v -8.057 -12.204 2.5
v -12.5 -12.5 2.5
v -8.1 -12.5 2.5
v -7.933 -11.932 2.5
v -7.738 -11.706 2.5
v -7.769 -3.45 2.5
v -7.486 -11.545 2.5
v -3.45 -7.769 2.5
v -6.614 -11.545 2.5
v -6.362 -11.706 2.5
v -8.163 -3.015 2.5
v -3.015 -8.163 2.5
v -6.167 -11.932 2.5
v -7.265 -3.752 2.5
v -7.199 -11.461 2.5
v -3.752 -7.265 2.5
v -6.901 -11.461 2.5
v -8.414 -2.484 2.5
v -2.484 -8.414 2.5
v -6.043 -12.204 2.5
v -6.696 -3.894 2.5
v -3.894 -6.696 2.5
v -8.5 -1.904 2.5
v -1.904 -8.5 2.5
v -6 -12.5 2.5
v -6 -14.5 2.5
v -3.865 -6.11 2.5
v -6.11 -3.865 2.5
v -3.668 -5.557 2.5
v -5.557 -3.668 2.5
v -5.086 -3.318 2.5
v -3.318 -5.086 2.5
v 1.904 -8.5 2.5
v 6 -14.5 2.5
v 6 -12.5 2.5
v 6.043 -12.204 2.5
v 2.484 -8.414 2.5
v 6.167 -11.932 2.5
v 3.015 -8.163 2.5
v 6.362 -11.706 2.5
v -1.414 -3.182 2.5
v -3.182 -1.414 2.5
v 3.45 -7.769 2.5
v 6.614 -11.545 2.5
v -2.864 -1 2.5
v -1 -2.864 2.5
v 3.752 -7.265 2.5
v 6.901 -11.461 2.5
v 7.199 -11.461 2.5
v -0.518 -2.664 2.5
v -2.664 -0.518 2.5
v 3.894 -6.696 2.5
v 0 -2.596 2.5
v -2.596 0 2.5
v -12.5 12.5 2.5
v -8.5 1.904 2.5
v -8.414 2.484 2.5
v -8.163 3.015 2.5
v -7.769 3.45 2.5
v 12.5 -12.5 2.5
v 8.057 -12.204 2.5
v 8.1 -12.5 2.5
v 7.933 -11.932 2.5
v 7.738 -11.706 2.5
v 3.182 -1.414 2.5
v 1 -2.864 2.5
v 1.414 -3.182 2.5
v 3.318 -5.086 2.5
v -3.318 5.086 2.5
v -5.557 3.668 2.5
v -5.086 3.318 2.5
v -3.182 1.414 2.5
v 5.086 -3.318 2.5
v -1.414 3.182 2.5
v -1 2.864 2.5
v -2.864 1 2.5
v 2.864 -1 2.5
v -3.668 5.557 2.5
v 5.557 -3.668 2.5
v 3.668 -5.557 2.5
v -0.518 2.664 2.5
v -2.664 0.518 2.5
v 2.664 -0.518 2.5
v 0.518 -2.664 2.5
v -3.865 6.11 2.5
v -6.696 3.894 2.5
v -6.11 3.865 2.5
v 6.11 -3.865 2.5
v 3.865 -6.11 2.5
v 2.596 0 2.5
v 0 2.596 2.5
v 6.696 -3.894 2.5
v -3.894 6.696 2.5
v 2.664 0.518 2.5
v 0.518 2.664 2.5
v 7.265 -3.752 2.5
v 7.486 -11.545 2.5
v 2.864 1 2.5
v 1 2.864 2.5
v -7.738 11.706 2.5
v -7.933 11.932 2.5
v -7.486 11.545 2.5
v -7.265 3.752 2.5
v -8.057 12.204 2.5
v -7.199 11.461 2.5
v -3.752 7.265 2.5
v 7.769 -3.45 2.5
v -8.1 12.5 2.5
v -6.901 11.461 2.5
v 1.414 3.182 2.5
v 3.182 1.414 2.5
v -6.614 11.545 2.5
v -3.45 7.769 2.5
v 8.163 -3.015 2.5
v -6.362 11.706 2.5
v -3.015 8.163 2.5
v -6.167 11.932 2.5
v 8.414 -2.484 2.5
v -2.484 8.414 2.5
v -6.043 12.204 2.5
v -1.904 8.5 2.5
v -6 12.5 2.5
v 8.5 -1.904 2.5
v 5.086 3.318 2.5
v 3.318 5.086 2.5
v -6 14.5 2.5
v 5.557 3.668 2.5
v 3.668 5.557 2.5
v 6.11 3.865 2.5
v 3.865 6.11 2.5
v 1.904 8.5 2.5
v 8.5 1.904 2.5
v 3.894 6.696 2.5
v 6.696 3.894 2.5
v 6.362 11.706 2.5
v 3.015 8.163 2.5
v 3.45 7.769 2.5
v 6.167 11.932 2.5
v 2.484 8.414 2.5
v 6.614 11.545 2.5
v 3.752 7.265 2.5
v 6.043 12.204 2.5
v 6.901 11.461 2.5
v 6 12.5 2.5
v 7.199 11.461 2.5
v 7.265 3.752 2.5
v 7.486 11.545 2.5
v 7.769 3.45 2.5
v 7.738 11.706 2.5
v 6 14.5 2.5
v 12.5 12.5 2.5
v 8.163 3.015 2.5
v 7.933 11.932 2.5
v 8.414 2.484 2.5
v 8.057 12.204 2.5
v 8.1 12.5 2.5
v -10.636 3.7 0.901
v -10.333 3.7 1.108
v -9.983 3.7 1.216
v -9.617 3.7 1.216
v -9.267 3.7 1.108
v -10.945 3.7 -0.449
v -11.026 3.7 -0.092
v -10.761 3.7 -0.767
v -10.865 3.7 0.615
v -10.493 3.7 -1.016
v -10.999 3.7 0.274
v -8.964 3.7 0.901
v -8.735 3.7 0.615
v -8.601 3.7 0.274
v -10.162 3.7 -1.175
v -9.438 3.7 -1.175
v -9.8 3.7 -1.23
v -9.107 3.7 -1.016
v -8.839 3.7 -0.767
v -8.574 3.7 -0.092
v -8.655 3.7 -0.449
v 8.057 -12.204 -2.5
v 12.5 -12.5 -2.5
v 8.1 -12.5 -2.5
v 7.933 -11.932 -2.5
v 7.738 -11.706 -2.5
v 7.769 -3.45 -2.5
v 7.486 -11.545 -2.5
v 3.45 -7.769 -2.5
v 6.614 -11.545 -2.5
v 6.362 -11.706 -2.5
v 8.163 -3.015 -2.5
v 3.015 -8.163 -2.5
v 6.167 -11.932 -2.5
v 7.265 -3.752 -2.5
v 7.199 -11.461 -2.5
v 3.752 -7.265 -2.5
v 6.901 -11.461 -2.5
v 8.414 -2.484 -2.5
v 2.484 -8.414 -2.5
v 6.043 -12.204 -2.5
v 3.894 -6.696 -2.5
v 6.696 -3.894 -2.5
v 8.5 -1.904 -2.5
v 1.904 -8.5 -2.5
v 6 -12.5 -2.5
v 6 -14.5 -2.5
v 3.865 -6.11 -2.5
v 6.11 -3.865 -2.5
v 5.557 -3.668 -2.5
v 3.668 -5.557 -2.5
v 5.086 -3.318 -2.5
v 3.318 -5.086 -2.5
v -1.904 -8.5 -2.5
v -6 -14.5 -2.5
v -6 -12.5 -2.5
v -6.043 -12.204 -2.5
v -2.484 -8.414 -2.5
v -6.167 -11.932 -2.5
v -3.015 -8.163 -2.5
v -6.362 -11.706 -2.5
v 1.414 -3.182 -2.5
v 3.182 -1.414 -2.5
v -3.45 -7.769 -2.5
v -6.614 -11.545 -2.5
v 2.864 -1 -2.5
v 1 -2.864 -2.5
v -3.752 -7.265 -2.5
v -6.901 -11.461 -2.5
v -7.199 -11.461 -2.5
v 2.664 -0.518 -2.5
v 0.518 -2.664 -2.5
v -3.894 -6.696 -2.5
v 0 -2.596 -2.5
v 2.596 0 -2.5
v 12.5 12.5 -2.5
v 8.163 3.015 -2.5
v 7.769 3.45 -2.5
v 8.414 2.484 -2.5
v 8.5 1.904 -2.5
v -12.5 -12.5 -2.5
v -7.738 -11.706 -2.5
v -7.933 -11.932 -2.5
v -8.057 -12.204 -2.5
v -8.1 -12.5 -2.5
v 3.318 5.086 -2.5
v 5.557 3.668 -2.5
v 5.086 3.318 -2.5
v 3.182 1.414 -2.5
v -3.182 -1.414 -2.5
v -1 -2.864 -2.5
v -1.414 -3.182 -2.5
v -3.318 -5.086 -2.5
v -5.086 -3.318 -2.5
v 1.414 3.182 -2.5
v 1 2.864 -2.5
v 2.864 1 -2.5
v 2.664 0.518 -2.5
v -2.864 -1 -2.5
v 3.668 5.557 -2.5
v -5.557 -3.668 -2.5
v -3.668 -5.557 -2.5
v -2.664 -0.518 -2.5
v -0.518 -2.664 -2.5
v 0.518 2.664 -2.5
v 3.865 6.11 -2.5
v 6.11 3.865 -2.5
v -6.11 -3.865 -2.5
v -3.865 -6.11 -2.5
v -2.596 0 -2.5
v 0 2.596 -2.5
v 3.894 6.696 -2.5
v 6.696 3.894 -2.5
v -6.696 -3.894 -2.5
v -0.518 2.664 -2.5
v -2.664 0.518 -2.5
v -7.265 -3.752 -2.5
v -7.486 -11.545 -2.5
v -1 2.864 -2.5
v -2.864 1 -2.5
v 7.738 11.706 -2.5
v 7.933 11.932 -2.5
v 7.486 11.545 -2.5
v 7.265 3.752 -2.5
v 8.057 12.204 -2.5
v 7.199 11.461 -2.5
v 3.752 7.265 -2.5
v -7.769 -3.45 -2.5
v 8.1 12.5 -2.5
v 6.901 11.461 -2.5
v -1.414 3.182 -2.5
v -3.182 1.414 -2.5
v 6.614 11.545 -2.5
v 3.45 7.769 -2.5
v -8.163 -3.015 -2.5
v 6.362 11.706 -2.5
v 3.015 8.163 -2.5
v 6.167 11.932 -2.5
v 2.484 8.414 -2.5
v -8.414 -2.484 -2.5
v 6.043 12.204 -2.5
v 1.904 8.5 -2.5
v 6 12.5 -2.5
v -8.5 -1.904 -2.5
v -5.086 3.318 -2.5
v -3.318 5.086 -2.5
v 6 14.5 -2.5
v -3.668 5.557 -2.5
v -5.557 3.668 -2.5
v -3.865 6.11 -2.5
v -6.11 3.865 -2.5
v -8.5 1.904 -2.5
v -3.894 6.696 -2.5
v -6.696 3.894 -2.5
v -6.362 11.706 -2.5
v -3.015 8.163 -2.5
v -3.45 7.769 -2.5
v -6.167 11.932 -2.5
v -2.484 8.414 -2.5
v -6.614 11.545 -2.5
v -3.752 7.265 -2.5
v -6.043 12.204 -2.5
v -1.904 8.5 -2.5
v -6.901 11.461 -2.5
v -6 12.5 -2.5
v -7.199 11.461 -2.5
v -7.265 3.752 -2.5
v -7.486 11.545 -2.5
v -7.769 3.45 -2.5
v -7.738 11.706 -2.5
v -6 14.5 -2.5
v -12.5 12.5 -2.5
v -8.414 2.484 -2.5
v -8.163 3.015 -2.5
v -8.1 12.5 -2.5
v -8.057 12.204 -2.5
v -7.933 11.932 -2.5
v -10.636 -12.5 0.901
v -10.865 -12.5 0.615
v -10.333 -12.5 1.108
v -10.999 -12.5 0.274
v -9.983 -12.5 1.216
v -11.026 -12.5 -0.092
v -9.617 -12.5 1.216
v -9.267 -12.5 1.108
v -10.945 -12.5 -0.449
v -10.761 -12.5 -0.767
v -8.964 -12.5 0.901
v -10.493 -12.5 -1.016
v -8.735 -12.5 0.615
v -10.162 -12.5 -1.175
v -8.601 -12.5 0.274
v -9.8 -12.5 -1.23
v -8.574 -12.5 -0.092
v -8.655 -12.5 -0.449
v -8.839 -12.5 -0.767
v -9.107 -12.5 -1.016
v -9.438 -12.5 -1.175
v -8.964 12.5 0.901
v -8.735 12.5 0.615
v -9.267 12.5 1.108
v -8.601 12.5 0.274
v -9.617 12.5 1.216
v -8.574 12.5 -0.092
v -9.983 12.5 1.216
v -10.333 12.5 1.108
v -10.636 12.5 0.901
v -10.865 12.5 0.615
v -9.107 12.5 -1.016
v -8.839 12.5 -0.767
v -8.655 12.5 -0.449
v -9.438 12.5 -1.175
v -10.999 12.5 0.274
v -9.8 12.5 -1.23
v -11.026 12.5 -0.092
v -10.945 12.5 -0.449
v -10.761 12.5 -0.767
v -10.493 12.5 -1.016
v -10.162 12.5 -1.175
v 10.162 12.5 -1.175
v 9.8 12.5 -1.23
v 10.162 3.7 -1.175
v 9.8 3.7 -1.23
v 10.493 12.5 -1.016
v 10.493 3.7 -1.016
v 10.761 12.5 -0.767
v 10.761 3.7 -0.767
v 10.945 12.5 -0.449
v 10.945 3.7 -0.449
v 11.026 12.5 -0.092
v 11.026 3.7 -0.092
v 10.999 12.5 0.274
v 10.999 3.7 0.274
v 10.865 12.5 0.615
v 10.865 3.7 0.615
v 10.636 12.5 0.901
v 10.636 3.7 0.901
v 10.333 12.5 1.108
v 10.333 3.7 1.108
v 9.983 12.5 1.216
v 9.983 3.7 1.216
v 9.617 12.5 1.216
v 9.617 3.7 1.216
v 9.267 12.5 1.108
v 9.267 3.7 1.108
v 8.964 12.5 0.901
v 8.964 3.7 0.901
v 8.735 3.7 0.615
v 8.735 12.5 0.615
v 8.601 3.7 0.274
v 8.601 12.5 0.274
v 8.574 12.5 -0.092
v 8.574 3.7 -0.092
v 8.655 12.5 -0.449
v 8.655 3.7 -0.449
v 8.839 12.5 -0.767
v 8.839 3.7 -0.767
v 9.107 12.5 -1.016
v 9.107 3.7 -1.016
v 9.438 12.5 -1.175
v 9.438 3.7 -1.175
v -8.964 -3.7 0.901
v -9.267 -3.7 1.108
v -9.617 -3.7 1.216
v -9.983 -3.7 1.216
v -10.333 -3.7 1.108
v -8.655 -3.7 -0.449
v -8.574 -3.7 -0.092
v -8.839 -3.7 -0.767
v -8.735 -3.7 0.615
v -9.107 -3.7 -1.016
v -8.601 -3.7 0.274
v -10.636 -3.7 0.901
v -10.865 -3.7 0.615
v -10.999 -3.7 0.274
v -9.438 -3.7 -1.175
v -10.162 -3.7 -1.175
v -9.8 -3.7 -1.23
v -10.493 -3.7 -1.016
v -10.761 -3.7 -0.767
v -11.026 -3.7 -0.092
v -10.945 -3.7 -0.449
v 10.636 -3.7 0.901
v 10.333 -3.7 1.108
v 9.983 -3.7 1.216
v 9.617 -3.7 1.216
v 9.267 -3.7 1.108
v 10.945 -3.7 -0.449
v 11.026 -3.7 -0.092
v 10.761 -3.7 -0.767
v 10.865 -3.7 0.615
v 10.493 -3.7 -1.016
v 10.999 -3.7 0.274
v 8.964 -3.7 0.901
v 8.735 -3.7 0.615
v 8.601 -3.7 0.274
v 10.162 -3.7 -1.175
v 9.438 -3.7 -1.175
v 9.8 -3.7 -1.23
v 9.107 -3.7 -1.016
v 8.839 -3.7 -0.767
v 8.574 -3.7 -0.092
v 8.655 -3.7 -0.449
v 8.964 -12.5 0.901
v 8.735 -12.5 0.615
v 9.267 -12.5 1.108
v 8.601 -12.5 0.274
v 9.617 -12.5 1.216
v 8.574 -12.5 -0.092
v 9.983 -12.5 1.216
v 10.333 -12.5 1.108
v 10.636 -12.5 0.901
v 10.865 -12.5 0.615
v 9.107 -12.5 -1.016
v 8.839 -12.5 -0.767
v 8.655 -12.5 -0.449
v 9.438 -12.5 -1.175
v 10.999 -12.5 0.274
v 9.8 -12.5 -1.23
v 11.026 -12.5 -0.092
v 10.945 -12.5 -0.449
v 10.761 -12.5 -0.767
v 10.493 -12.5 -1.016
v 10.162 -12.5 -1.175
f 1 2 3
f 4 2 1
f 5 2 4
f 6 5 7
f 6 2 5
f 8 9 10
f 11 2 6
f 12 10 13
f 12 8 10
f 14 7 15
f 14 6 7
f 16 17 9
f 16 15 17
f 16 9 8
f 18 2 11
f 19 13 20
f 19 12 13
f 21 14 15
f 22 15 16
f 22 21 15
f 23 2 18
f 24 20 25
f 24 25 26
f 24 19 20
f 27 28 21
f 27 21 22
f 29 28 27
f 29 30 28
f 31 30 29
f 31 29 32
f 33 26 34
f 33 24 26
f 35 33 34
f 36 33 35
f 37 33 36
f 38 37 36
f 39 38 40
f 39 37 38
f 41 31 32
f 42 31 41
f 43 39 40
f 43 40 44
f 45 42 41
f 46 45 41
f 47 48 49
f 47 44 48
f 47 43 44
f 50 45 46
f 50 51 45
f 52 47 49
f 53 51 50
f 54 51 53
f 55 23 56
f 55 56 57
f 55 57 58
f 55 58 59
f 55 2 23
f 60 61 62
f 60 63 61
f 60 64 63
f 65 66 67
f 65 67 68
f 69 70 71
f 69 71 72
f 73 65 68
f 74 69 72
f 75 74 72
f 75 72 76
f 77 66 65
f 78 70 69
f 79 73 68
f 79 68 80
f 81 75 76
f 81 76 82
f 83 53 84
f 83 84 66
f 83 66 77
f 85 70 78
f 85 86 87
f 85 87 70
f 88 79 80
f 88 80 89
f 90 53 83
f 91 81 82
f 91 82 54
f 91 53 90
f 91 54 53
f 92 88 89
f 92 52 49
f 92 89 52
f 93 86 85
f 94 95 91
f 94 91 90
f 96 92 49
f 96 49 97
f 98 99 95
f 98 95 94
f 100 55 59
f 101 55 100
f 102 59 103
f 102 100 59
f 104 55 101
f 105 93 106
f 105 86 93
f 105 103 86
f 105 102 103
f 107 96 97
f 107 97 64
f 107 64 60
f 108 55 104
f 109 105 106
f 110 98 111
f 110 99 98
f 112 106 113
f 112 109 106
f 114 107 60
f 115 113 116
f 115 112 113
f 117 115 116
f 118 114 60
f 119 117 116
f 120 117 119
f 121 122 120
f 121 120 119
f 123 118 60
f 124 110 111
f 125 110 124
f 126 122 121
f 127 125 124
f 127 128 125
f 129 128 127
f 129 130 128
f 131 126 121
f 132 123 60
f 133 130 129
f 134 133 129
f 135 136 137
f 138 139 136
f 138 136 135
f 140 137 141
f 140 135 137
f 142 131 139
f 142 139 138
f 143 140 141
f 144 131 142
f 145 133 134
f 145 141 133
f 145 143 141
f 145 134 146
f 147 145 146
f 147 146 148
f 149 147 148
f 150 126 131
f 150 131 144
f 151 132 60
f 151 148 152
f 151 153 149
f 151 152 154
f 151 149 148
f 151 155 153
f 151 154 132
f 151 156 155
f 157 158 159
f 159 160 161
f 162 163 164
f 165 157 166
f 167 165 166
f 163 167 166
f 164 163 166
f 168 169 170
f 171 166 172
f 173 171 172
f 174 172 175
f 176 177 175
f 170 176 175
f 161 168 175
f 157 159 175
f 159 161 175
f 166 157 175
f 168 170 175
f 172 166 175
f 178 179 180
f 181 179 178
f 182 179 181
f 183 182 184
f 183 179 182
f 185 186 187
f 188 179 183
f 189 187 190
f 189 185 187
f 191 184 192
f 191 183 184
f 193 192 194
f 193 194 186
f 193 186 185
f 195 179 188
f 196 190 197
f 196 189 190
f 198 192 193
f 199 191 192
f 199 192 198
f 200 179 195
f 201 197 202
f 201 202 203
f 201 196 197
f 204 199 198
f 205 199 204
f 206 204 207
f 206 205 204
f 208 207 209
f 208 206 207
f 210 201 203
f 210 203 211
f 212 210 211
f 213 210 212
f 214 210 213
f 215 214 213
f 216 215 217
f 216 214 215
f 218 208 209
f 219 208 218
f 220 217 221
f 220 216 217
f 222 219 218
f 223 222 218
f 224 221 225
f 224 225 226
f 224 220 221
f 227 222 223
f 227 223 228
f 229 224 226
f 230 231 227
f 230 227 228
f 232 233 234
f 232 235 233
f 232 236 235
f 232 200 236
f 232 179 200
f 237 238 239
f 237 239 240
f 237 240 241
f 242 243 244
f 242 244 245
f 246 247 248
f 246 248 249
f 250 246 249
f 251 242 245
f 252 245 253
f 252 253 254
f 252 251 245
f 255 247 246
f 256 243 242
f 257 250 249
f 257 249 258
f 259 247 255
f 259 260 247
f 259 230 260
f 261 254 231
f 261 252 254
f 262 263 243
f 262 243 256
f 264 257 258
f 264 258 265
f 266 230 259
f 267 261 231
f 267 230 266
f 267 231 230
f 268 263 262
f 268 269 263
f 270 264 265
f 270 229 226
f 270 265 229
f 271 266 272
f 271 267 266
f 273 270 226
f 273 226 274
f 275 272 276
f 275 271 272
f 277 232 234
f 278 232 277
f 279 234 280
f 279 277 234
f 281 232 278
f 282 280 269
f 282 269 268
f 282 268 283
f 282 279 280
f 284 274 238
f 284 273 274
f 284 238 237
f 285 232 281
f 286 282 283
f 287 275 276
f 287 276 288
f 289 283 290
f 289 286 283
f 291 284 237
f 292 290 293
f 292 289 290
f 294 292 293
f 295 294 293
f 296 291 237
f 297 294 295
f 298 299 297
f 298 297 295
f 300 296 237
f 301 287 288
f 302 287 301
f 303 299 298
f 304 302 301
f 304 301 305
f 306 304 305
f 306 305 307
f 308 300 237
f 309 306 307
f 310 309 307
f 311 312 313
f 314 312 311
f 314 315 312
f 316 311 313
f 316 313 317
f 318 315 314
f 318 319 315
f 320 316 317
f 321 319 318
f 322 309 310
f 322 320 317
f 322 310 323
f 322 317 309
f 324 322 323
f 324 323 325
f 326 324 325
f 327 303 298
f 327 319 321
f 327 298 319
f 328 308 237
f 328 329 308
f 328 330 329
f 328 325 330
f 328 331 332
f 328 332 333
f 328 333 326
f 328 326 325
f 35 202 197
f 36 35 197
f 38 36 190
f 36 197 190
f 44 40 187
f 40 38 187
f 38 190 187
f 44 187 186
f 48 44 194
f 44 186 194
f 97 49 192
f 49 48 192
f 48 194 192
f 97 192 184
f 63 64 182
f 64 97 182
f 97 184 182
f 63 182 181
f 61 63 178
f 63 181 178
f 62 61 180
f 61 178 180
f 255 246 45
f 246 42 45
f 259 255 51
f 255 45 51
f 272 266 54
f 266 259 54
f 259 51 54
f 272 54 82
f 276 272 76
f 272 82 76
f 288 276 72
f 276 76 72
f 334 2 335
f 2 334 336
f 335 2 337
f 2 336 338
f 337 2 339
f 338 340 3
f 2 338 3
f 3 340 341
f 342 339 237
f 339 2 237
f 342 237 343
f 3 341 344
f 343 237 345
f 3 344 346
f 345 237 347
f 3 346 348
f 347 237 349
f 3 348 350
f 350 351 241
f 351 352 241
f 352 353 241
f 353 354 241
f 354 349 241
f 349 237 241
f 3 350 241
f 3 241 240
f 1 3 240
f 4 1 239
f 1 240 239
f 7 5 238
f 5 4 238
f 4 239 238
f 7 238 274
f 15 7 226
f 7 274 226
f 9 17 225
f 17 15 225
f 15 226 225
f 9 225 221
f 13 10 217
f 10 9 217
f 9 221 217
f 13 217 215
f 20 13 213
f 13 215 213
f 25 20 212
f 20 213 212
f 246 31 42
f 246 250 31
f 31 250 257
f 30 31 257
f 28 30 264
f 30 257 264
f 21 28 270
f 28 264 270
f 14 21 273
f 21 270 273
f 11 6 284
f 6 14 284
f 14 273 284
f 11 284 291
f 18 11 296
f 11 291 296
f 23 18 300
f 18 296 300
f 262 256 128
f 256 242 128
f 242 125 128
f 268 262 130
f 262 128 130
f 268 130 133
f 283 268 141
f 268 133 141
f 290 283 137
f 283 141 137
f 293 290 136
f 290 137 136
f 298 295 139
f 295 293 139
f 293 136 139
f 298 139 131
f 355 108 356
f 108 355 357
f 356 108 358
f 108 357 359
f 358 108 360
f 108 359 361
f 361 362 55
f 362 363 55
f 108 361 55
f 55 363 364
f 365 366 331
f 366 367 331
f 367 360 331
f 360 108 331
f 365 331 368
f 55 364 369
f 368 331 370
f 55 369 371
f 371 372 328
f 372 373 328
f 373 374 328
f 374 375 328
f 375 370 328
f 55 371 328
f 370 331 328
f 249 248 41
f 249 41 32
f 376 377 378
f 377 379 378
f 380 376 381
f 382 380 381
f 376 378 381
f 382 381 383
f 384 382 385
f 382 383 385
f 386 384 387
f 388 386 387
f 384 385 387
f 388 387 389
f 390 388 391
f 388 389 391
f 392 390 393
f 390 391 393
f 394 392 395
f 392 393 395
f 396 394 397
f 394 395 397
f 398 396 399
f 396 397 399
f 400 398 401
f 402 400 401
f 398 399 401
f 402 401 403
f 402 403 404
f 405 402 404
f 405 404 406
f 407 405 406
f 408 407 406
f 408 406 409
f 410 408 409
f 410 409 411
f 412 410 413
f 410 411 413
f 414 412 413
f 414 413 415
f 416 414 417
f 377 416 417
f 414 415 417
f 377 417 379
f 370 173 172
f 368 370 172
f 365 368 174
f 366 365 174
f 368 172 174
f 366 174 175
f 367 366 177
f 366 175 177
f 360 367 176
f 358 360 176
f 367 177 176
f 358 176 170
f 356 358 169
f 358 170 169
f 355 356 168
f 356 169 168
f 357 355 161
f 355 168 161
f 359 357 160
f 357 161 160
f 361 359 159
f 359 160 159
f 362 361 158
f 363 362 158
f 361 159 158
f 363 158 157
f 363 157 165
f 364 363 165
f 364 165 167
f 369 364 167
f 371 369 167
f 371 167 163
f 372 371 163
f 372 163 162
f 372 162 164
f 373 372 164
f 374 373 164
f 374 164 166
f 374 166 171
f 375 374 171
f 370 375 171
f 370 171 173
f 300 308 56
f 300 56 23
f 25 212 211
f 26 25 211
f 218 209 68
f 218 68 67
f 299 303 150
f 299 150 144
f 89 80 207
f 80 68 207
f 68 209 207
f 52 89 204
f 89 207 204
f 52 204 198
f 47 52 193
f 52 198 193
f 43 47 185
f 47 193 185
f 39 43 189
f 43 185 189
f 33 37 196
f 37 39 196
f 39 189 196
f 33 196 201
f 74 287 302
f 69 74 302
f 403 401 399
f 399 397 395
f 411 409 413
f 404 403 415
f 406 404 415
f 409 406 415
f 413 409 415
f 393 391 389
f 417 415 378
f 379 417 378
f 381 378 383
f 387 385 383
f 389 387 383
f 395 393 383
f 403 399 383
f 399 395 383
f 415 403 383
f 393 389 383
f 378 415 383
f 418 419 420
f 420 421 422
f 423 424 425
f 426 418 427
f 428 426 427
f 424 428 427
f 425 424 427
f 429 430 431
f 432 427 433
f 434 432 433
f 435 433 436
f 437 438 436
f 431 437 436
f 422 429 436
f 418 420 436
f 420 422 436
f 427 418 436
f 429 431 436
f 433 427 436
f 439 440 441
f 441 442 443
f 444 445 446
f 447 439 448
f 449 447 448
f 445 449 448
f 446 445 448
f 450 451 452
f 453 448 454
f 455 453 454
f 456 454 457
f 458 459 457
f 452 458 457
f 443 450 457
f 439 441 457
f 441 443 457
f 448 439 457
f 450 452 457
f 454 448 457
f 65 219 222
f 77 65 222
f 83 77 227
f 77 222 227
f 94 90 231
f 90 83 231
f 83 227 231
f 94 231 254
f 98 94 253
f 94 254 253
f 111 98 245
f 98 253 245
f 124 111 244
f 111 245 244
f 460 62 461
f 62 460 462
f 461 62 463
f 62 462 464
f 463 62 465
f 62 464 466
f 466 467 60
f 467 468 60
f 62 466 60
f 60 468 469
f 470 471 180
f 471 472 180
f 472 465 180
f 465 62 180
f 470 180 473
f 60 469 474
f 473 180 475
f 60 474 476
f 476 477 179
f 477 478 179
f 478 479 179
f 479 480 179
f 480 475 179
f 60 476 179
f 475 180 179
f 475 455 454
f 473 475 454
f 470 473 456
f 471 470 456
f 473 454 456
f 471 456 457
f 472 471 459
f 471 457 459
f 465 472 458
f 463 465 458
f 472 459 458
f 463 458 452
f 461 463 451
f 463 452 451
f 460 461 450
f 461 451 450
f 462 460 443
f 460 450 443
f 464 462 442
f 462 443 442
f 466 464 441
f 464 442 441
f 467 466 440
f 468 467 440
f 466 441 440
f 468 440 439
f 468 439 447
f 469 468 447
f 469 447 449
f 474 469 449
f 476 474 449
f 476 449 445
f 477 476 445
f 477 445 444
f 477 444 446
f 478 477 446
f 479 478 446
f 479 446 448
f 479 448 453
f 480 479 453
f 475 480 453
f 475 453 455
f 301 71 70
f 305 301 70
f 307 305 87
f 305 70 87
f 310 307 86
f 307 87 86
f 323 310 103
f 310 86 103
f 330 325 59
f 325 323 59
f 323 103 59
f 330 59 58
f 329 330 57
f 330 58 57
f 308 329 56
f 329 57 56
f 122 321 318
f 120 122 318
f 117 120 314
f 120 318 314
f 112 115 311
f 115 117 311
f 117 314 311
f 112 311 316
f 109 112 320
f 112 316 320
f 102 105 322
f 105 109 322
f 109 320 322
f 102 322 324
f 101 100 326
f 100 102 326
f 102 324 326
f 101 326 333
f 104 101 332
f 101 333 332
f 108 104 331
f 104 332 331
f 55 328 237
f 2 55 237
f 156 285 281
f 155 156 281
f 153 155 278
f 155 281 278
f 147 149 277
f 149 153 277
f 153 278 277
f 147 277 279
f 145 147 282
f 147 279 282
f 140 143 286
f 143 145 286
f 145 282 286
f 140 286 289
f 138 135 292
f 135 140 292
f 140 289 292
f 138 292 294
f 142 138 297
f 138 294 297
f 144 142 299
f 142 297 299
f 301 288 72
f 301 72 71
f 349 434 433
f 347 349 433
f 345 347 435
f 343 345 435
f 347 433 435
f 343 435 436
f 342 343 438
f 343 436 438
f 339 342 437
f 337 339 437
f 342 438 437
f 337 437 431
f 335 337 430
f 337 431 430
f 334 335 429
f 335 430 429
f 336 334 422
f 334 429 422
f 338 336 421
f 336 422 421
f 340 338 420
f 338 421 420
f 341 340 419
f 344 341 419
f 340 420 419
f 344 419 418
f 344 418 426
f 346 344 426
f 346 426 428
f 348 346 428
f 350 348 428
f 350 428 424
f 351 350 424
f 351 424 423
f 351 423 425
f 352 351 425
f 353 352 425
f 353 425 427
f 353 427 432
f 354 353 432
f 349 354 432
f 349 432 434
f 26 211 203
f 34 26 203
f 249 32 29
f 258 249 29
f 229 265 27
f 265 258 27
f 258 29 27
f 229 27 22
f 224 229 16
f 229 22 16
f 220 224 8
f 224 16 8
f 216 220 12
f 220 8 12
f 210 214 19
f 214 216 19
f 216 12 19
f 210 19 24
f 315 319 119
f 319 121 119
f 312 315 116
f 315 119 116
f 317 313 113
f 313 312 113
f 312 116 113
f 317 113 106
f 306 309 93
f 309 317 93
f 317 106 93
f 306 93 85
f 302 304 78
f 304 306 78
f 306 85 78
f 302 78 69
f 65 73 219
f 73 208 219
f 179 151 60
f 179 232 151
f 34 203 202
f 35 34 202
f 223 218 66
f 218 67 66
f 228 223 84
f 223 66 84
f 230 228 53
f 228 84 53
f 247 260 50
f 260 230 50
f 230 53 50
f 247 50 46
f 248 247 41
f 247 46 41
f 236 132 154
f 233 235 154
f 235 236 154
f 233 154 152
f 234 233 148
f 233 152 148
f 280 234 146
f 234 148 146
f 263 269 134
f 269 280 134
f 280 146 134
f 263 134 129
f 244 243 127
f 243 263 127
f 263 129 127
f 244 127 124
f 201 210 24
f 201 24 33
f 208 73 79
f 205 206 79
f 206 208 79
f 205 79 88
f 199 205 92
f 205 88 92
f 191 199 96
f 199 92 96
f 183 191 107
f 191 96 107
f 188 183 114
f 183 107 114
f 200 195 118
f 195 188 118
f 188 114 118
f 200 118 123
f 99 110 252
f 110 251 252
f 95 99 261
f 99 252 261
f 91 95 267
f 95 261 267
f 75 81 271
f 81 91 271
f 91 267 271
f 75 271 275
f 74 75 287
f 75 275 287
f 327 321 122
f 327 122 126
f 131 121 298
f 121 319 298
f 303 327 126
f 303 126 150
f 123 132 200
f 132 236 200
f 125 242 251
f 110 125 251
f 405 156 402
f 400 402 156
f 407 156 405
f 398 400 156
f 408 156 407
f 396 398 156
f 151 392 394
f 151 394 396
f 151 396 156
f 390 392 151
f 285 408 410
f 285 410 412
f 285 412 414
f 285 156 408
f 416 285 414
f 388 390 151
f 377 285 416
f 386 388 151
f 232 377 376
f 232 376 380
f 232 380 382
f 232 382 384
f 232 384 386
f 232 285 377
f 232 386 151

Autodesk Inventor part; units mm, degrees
ref_plane "YZ Plane" through (0, 0, 0) normal (1, 0, 0) x (0, 1, 0)
ref_plane "XZ Plane" through (0, 0, 0) normal (0, 1, 0) x (-1, 0, 0)
ref_plane "XY Plane" through (0, 0, 0) normal (0, 0, 1) x (1, 0, 0)
sketch "スケッチ1" plane through (0, 0, 0) normal (0, 0, 1) x (1, 0, 0)
  line L0 (-12.5, -12.5) -> (12.5, -12.5) construction
  line L1 (12.5, -12.5) -> (12.5, 12.5) construction
  line L2 (12.5, 12.5) -> (-12.5, 12.5) construction
  line L3 (-12.5, 12.5) -> (-12.5, -12.5) construction
  line L4 (-12.5, -12.5) -> (12.5, 12.5) construction
  line L5 (12.5, -12.5) -> (-12.5, 12.5) construction
  line L6 (-8.1, 12.5) -> (-12.5, 12.5)
  line L7 (-12.5, 12.5) -> (-12.5, 8.1)
  line L8 (8.1, 12.5) -> (12.5, 12.5)
  line L9 (12.5, 12.5) -> (12.5, 8.1)
  line L10 (-12.5, -8.1) -> (-12.5, -12.5)
  line L11 (-12.5, -12.5) -> (-8.1, -12.5)
  line L12 (8.1, -12.5) -> (12.5, -12.5)
  line L13 (12.5, -12.5) -> (12.5, -8.1)
  line L14 (-6, 12.5) -> (-6, 14.5)
  line L15 (-6, 14.5) -> (6, 14.5)
  line L16 (6, 14.5) -> (6, 12.5)
  arc A0 (-8.1, 12.5) -> (-6, 12.5) centre (-7.05, 12.5) ccw
  arc A1 (6, 12.5) -> (8.1, 12.5) centre (7.05, 12.5) ccw
  line L17 (0, 12.5) -> (0, 0) construction
  line L18 (0, 0) -> (12.5, 0) construction
  line L19 (-12.5, 6) -> (-14.5, 6) construction
  line L20 (-14.5, 6) -> (-14.5, -6) construction
  line L21 (-14.5, -6) -> (-12.5, -6) construction
  arc A2 (-12.5, 6) -> (-12.5, 8.1) centre (-12.5, 7.05) ccw
  arc A3 (-12.5, -8.1) -> (-12.5, -6) centre (-12.5, -7.05) ccw construction
  line L22 (-6, -12.5) -> (-6, -14.5)
  line L23 (-6, -14.5) -> (6, -14.5)
  line L24 (6, -14.5) -> (6, -12.5)
  arc A4 (-6, -12.5) -> (-8.1, -12.5) centre (-7.05, -12.5) ccw
  arc A5 (8.1, -12.5) -> (6, -12.5) centre (7.05, -12.5) ccw
  line L25 (12.5, 6) -> (14.5, 6) construction
  line L26 (14.5, 6) -> (14.5, -6) construction
  line L27 (14.5, -6) -> (12.5, -6) construction
  arc A6 (12.5, 8.1) -> (12.5, 6) centre (12.5, 7.05) ccw construction
  arc A7 (12.5, -6) -> (12.5, -8.1) centre (12.5, -7.05) ccw construction
  line L28 (-9.05, 12.5) -> (-5.95, 12.5) construction
  line L29 (-5.95, 12.5) -> (-5.95, 9.5) construction
  line L30 (-5.95, 9.5) -> (-9.05, 9.5) construction
  line L31 (-9.05, 9.5) -> (-9.05, 12.5) construction
  line L32 (-12.5, 9.05) -> (-9.5, 9.05) construction
  line L33 (-9.5, 9.05) -> (-9.5, 5.95) construction
  line L34 (-9.5, 5.95) -> (-12.5, 5.95) construction
  line L35 (-12.5, 5.95) -> (-12.5, 9.05) construction
  line L36 (-6.7322, 8.5) -> (6.7322, 8.5)
  line L37 (6.7322, 8.5) -> (0, 1.7678)
  line L38 (0, 1.7678) -> (-6.7322, 8.5)
  line L39 (-8.5, 6.7322) -> (-8.5, -6.7322)
  line L40 (-8.5, -6.7322) -> (-1.7678, 0)
  line L41 (-1.7678, 0) -> (-8.5, 6.7322)
  line L42 (-6.7322, -8.5) -> (6.7322, -8.5)
  line L43 (6.7322, -8.5) -> (0, -1.7678)
  line L44 (0, -1.7678) -> (-6.7322, -8.5)
  line L45 (8.5, 6.7322) -> (8.5, -6.7322)
  line L46 (8.5, -6.7322) -> (1.7678, 0)
  line L47 (1.7678, 0) -> (8.5, 6.7322)
  line L48 (-7.5, 12.5) -> (-7.5, 9.5) construction
  line L49 (-9.5, 7.5) -> (-12.5, 7.5) construction
  line L50 (-12.5, -12.5) -> (-12.5, 12.5)
  line L51 (12.5, -12.5) -> (12.5, 12.5)
  dimension "d0" = 25
  dimension "d1" = 1.05
  dimension "d2" = 2
  dimension "d3" = 6.5
  dimension "d4" = 3.1
  dimension "d6" = 3
  dimension "d8" = 3
  dimension "d9" = 2.5
  dimension "d10" = 2.5
  dimension "d11" = 2.5
  dimension "d12" = 2.5
  dimension "d13" = 4
  dimension "d17" = 5
  dimension "d18" = 5
  dimension "d31" = 25
extrude "押し出し1" add sketch "スケッチ1" along normal blind 2.5
mirror "ミラー1" about plane through (0, 0, 0) normal (0, 0, -1) of "押し出し1"
sketch "スケッチ2" plane through (-12.5, -12.5, 2.5) normal (0, -1, 0) x (1, 0, 0)
  line L0 (0, -5) -> (0, 0) projected
  line L1 (6.5, 0) -> (18.5, 0) construction
  line L2 (12.5, 0) -> (12.5, -5) construction
  point P0 (12.5, -2.5)
  point P1 (2.7, -2.5)
  point P2 (22.3, -2.5)
  point P3 (0, -2.5)
  dimension "d19" = 2.7
hole "穴1" at (-9.8, -12.5, 0) at (9.8, -12.5, 0) direction (0, 1, 0) diameter 2.459 depth 8.8 thread size "M3x0.5" class "6H" standard "ISO Metric profile"
pattern_circular "円形状パターン1" count 2 over 360 about axis through (0, 0, -10) along (0, 0, 1) of "穴1"
fillet "フィレット1" radius 2 12 edges at (8.5, 6.7322, 0) (8.5, -6.7322, 0) (6.7322, -8.5, 0) (0, 1.7678, 0) (-1.7678, 0, 0) (-6.7322, -8.5, 0) (-8.5, -6.7322, 0) (6.7322, 8.5, 0) (-8.5, 6.7322, 0) (-6.7322, 8.5, 0) (0, -1.7678, 0) (1.7678, 0, 0)
equation "\"d8\" = d6"
equation "\"d10\" = d9"
equation "\"d11\" = d10"
equation "\"d12\" = d11"
equation "\"d18\" = d17"
properties part number "Head_horizontal_frame_02" material "アセタール樹脂、黒"
